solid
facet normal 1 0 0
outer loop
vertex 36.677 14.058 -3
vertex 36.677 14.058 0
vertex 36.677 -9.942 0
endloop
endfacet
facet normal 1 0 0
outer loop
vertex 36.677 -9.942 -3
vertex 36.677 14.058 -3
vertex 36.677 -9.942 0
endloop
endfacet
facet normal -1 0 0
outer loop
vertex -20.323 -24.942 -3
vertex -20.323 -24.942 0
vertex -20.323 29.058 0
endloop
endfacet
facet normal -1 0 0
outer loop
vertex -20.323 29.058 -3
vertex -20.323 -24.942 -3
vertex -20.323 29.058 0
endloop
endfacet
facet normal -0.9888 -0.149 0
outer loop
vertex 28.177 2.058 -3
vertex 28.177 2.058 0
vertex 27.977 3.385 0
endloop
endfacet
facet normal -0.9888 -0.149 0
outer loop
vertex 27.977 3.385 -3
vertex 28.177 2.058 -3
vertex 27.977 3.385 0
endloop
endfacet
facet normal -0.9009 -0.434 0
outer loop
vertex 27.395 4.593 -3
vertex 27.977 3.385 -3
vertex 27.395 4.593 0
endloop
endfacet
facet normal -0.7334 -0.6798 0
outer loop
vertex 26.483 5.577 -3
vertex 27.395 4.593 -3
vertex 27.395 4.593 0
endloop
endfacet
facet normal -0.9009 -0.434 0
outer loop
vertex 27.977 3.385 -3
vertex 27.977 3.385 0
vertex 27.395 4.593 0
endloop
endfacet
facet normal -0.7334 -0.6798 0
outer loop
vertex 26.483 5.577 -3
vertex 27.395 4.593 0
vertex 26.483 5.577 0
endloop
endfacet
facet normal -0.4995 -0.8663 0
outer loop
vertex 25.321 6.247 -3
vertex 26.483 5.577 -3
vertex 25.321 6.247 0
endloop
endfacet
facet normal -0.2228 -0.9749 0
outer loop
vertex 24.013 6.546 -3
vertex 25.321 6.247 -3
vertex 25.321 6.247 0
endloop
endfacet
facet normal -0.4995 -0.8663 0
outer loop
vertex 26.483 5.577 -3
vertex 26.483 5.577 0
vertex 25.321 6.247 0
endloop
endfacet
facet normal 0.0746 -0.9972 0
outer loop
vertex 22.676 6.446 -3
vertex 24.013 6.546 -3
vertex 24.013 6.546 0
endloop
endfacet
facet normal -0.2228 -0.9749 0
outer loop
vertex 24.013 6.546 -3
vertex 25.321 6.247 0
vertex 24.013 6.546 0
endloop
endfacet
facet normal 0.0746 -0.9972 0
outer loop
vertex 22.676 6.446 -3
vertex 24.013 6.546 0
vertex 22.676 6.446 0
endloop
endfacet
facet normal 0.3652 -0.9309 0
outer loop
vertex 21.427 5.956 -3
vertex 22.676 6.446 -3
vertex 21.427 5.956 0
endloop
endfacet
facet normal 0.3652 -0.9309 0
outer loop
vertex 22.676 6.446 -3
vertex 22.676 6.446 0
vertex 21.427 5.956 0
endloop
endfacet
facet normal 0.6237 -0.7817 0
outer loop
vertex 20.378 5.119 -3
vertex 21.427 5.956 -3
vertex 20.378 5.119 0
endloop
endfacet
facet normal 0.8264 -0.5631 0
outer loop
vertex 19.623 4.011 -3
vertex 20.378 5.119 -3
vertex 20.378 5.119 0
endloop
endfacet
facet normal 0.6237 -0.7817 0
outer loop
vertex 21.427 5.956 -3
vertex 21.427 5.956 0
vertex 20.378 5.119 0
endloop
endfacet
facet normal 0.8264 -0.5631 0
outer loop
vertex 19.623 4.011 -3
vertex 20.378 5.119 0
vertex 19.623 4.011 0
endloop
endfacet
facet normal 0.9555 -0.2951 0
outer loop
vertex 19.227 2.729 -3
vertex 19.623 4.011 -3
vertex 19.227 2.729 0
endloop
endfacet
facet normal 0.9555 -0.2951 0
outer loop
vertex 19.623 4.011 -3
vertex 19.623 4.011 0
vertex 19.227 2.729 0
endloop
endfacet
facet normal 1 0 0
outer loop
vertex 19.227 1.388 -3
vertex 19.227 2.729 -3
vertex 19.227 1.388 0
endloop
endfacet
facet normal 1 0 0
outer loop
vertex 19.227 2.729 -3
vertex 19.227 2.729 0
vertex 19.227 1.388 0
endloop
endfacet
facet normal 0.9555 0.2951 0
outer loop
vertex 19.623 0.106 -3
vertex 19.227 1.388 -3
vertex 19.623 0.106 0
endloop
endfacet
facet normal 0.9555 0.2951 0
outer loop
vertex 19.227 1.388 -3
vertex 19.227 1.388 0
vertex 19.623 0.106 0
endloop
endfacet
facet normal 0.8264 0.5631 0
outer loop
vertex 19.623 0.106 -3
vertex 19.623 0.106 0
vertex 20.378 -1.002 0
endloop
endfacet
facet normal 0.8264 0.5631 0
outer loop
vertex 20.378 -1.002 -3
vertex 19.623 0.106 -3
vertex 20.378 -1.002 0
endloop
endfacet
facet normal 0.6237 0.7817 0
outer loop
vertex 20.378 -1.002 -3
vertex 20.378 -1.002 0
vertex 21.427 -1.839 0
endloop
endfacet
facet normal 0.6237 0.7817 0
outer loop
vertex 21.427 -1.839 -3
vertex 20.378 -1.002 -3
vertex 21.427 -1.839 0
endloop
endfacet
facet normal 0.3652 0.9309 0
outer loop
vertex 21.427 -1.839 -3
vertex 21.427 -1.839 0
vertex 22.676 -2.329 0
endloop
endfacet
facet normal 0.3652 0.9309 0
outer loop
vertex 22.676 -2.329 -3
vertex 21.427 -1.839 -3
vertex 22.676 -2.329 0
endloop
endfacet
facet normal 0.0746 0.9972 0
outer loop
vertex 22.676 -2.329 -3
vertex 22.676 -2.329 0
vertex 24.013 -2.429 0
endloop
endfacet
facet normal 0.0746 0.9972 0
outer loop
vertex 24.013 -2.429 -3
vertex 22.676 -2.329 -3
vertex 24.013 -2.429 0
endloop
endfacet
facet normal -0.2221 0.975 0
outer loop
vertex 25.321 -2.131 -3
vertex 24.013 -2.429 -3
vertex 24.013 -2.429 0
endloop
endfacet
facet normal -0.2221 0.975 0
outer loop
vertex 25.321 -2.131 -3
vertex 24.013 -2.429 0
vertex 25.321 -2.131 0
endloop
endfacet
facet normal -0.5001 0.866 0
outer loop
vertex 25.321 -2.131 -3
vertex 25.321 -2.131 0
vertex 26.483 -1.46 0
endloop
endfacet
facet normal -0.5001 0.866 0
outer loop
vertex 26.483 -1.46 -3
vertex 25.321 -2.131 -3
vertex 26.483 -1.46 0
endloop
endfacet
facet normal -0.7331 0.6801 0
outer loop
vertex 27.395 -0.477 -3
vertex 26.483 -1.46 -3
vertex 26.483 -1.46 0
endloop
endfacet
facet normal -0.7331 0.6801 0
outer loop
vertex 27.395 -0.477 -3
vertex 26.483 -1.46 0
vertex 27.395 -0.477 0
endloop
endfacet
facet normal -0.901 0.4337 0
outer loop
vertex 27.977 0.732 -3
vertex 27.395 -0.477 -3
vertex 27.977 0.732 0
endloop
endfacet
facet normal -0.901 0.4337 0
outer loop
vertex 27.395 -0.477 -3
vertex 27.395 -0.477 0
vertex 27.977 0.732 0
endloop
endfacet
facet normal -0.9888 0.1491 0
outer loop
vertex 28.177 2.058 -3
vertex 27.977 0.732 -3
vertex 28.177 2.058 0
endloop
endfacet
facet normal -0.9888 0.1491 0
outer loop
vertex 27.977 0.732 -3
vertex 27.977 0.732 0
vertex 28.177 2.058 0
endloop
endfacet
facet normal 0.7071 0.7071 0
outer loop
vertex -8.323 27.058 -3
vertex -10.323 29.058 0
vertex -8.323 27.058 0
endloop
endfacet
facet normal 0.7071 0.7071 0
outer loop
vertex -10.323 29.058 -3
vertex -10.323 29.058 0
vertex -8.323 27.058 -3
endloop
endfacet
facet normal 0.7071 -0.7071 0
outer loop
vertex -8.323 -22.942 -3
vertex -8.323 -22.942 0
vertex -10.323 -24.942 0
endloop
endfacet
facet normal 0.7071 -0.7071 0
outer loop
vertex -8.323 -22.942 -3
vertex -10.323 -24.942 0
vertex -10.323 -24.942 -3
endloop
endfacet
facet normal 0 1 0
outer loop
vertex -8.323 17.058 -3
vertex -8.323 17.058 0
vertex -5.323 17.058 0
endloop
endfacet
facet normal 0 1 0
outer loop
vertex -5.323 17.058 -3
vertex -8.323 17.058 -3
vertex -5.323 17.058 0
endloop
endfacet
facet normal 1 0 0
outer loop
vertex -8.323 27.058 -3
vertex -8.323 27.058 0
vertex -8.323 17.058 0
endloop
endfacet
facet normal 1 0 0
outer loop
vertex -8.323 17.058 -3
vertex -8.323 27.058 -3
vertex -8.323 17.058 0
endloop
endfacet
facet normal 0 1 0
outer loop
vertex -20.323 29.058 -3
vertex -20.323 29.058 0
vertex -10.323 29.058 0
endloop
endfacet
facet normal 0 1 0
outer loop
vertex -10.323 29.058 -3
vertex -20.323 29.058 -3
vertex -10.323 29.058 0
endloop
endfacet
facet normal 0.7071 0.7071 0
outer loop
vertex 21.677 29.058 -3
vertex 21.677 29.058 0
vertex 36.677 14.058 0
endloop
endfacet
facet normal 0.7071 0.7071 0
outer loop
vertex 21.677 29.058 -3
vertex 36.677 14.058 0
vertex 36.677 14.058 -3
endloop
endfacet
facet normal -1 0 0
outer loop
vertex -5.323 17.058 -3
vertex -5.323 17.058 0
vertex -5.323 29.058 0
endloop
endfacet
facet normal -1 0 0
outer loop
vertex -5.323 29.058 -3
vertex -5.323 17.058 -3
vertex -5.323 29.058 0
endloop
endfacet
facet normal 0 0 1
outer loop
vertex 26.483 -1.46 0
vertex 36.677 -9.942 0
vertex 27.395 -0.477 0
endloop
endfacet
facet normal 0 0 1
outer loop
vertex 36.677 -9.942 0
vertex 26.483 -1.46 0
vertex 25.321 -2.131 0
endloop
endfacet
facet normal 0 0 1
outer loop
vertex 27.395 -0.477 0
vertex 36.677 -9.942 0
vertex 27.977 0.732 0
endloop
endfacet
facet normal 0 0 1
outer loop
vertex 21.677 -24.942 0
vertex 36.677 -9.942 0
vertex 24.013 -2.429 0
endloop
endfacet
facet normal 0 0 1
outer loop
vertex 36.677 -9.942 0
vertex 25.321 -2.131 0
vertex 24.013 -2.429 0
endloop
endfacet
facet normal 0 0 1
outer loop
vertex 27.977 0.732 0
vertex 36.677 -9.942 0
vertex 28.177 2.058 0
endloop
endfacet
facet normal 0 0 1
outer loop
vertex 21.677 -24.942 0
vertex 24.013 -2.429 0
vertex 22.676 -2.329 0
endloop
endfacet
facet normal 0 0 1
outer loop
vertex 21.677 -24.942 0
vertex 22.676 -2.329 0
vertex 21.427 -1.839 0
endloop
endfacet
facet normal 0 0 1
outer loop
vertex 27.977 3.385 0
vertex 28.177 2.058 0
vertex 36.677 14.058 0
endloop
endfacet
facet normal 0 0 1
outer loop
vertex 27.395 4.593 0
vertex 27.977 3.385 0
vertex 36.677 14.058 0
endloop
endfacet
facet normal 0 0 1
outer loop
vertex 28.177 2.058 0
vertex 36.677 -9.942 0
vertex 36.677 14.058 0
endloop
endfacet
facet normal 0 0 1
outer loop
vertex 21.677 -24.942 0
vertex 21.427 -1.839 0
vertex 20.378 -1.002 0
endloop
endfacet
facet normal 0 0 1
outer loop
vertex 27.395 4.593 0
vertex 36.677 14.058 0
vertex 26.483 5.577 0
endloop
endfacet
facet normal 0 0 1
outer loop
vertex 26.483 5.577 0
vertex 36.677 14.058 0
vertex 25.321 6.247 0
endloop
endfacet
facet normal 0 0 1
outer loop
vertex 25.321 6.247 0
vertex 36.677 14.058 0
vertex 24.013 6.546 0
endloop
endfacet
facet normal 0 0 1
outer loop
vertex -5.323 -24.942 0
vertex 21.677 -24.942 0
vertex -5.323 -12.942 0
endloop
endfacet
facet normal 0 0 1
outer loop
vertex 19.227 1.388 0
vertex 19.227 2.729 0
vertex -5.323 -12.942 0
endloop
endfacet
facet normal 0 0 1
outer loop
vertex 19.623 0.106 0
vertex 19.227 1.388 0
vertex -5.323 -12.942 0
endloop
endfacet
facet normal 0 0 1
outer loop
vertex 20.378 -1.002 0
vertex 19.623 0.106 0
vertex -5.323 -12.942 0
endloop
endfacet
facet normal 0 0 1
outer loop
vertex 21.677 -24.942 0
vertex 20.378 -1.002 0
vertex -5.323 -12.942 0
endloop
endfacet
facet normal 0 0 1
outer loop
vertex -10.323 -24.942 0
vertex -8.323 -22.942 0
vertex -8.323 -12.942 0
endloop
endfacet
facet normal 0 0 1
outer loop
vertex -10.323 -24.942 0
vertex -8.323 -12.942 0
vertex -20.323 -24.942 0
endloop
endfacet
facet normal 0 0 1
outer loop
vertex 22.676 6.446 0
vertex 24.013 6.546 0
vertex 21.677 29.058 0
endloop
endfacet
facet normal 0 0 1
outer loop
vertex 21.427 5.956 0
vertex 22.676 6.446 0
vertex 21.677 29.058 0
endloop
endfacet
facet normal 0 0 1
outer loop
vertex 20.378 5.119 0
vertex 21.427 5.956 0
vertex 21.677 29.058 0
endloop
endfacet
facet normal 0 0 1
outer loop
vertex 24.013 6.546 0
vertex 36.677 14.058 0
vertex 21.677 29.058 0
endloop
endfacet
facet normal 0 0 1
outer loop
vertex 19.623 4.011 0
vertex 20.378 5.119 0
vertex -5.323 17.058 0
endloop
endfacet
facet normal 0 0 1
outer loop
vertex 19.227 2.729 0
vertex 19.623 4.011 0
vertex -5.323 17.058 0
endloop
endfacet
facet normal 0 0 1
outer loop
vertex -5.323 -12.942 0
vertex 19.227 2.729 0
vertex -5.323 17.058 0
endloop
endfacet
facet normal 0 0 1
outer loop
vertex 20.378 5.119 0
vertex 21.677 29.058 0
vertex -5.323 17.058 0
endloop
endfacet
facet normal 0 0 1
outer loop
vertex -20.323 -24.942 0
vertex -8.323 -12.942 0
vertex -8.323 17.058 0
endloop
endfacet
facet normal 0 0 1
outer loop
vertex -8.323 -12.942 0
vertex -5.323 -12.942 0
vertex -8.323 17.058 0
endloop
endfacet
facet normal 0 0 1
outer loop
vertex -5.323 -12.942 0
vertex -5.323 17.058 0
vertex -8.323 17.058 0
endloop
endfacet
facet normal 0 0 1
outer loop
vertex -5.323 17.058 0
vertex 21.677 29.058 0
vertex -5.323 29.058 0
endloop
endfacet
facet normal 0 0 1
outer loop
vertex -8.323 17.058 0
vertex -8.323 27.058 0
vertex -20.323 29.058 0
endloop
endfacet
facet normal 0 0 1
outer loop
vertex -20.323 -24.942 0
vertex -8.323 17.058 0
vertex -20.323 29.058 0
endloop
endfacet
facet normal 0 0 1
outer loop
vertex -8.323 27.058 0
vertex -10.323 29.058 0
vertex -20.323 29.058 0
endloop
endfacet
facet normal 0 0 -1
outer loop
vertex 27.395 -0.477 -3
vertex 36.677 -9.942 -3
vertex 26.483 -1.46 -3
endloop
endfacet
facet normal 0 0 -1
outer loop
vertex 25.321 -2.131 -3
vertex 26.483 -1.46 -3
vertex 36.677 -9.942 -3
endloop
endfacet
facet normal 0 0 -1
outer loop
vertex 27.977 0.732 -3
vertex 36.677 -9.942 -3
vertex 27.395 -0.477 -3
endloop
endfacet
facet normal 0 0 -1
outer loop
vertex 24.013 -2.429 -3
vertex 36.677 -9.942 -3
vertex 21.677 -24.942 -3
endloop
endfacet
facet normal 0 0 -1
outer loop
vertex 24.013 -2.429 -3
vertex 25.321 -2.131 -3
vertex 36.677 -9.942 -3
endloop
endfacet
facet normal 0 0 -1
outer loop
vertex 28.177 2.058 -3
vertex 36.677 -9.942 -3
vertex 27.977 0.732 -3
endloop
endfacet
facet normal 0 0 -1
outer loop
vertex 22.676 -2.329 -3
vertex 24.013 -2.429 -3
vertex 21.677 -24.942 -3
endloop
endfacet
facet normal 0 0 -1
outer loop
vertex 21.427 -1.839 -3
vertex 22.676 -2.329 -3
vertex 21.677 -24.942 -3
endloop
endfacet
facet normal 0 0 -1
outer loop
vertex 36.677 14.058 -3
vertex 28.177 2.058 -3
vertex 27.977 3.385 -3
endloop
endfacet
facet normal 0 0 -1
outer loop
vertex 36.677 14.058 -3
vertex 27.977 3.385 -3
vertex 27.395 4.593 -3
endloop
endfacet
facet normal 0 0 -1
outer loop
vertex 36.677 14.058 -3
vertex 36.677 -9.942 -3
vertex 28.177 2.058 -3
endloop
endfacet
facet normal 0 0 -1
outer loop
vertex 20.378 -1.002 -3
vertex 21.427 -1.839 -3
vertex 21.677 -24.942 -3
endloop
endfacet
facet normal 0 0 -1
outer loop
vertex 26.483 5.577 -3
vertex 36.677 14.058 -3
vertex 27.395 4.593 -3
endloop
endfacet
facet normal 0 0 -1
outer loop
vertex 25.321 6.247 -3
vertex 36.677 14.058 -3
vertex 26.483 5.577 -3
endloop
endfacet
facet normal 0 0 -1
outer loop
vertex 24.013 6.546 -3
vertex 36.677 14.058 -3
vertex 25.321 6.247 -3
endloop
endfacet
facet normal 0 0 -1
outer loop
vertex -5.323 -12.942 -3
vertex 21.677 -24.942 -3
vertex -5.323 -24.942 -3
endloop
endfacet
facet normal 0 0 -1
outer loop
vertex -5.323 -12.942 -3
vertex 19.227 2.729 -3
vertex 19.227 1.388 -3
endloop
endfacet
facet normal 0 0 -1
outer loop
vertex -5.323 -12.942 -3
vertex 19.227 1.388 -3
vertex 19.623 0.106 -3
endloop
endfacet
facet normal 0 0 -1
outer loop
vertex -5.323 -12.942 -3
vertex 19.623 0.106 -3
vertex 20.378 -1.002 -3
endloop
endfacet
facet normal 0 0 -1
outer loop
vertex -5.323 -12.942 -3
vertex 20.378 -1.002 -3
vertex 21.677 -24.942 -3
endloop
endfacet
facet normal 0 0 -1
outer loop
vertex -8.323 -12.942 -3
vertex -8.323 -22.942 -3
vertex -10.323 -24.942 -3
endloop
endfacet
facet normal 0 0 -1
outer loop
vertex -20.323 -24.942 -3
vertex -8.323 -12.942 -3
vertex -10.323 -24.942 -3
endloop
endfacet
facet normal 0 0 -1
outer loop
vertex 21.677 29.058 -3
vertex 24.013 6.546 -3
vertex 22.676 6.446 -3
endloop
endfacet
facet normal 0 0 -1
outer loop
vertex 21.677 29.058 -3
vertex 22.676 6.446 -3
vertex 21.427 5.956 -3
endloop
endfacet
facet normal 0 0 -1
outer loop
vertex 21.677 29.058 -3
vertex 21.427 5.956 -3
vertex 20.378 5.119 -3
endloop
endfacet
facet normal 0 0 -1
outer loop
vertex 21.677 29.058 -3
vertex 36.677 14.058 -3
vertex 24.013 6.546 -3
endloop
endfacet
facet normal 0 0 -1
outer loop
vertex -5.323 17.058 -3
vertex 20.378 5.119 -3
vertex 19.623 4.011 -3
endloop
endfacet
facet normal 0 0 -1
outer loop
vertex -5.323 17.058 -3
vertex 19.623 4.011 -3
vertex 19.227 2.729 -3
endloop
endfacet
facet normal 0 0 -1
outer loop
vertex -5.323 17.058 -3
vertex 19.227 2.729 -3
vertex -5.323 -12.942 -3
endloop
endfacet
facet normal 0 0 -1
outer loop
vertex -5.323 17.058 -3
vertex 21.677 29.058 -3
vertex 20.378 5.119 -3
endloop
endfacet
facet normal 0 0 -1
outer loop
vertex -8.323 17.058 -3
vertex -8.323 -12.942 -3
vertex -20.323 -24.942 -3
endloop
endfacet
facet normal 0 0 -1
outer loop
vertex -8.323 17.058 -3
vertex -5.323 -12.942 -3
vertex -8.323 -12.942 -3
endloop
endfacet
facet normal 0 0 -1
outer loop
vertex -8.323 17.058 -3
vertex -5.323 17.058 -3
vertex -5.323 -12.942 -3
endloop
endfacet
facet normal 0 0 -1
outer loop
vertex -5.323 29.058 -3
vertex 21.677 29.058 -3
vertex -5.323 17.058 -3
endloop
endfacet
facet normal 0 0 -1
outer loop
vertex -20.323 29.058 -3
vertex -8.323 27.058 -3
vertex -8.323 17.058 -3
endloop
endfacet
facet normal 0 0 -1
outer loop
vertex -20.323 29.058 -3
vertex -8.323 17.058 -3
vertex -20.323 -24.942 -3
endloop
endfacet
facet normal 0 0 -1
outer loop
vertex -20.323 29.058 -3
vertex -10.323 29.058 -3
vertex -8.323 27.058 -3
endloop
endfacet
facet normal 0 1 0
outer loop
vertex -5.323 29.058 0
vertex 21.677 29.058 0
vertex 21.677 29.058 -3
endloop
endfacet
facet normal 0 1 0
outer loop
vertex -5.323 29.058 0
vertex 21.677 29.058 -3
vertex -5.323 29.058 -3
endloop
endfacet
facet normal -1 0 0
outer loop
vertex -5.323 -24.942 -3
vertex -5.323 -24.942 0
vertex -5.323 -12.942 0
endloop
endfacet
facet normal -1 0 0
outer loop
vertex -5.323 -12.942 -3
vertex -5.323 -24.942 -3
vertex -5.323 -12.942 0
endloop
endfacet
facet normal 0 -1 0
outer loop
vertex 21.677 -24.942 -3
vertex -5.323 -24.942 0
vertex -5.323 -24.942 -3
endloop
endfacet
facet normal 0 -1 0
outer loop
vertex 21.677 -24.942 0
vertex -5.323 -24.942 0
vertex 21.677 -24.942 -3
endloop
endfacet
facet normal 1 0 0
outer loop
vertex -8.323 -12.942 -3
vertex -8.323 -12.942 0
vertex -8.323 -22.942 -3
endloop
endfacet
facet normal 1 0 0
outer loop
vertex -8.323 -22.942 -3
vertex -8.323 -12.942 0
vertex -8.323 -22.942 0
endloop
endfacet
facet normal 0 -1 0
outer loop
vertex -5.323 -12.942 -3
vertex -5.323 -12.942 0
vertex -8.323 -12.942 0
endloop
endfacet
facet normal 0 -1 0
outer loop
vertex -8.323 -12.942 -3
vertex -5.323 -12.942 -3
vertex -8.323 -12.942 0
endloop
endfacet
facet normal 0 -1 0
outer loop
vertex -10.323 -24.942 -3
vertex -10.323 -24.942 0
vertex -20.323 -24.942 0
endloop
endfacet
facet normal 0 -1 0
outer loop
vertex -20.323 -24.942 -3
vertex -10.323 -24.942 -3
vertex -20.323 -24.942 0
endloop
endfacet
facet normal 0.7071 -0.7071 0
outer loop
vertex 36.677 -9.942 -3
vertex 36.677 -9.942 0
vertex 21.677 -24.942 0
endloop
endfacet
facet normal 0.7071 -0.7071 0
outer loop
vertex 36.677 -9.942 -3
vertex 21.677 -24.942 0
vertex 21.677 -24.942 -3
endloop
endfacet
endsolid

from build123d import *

# Parameters (mm, degrees)
SKETCH1_R          = 4.5
BASE_FLANGE1_DEPTH = 3
CHAMFER2_SIZE      = 15
CHAMFER3_SIZE      = 2


# Sheet-metal steps are written as plain solids
with BuildPart() as part:
    # Sketch1 → Base-Flange1 (new body)
    with BuildSketch(Plane.XY):
        Polygon((-5.322794555, 29.058388501), (23.677205445, 29.058388501), (36.677205445, 29.058388501), (36.677205445, -24.941611499), (17.443611724, -24.941611499), (-5.322794555, -24.941611499), (-5.322794555, -12.941611499), (-8.322794555, -12.941611499), (-8.322794555, -24.941611499), (-20.322794555, -24.941611499), (-20.322794555, 29.058388501), (-8.322794555, 29.058388501), (-8.322794555, 17.058388501), (-5.322794555, 17.058388501), align=None)
        with Locations((23.677205445, 2.058388501)):
            Circle(SKETCH1_R, mode=Mode.SUBTRACT)
    extrude(amount=-BASE_FLANGE1_DEPTH)

    # Chamfer2
    chamfer2_edges = [part.edges().sort_by_distance(p)[0] for p in [
        (36.677205445, 29.058388501, -1.5),
        (36.677205445, -24.941611499, -1.5),
    ]]
    chamfer(chamfer2_edges, length=CHAMFER2_SIZE)

    # Chamfer3
    chamfer3_edges = [part.edges().sort_by_distance(p)[0] for p in [
        (-8.322794555, -24.941611499, -1.5),
        (-8.322794555, 29.058388501, -1.5),
    ]]
    chamfer(chamfer3_edges, length=CHAMFER3_SIZE)


solid = part.part
